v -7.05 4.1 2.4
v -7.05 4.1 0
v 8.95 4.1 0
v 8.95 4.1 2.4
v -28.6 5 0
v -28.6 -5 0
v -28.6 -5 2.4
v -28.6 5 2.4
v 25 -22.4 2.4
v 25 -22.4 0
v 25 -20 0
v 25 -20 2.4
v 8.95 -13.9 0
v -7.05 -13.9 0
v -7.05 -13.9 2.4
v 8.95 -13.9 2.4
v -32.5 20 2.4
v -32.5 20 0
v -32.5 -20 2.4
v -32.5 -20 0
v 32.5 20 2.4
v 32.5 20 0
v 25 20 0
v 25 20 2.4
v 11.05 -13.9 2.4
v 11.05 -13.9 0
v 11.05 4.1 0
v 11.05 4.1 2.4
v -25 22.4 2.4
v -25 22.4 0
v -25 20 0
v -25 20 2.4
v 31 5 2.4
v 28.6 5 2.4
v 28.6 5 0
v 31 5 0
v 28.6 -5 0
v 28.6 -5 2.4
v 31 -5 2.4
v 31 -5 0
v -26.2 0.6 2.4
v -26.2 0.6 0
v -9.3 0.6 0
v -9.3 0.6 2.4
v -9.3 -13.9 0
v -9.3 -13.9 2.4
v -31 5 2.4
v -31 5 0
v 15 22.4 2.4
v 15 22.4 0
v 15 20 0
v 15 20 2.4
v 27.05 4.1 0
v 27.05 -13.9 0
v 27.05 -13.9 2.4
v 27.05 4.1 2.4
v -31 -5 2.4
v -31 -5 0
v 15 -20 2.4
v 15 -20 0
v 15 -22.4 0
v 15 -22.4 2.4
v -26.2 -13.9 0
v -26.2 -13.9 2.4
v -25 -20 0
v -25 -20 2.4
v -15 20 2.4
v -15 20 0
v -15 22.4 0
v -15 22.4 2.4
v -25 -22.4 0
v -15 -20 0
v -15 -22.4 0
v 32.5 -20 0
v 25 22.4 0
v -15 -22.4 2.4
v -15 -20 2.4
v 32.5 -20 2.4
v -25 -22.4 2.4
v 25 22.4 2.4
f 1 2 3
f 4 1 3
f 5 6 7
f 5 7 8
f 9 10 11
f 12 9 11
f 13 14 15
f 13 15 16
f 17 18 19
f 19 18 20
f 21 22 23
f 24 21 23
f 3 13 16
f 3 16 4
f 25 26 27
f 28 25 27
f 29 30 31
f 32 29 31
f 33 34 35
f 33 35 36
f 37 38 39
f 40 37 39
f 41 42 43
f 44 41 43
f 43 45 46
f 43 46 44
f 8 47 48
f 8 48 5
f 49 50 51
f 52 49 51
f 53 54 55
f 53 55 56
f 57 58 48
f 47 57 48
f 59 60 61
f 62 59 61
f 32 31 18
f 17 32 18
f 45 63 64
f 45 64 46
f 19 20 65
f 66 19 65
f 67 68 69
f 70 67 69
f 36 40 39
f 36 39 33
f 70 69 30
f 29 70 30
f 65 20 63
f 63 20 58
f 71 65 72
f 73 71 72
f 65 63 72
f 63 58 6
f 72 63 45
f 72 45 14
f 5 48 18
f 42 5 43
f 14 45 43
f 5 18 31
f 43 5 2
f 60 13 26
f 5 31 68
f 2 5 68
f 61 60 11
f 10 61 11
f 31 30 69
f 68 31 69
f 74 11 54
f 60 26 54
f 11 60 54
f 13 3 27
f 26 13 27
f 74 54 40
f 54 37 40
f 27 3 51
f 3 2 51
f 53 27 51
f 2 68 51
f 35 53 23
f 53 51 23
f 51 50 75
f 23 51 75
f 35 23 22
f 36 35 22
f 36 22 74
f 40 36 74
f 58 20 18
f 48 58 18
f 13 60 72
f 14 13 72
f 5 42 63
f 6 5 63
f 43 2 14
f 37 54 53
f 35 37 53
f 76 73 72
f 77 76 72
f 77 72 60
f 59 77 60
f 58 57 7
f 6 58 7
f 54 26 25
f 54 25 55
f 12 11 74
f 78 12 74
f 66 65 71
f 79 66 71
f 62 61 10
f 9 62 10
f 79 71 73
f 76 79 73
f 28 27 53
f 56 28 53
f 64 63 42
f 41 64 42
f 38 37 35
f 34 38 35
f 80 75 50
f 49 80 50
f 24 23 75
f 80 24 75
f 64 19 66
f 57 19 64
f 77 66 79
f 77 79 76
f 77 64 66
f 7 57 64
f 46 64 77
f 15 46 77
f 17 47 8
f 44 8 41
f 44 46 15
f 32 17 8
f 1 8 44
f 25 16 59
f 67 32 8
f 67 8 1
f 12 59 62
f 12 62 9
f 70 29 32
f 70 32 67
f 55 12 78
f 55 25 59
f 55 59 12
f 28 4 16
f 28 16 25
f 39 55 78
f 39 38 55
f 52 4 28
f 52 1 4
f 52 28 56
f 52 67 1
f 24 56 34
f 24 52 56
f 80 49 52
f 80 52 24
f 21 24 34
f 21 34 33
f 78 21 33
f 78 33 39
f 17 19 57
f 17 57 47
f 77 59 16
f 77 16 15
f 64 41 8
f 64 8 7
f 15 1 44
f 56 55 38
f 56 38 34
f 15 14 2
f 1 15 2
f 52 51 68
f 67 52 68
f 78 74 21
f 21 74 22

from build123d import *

# Parameters (mm, degrees)
F0_W     = 16.9
F0_H     = 14.5
F0_W_2   = 16
F0_H_2   = 18
F0_W_3   = 2.4
F0_H_3   = 10
F1_DEPTH = 2.4


with BuildPart() as f1:
    # F0 (on Top) → F1 (new body)
    with BuildSketch(Plane.XY):
        Polygon((32.5, -20), (32.5, 20), (25, 20), (25, 22.4), (15, 22.4), (15, 20), (-15, 20), (-15, 22.4), (-25, 22.4), (-25, 20), (-32.5, 20), (-32.5, -20), (-25, -20), (-25, -22.4), (-15, -22.4), (-15, -20), (7.5, -20), (15, -20), (15, -22.4), (25, -22.4), (25, -20), align=None)
        with Locations((-17.75, -6.65)):
            Rectangle(F0_W, F0_H, mode=Mode.SUBTRACT)
        with Locations((0.95, -4.9)):
            Rectangle(F0_W_2, F0_H_2, mode=Mode.SUBTRACT)
        with Locations((19.05, -4.9)):
            Rectangle(F0_W_2, F0_H_2, mode=Mode.SUBTRACT)
        with Locations((-29.8, 0)):
            Rectangle(F0_W_3, F0_H_3, mode=Mode.SUBTRACT)
        with Locations((29.8, 0)):
            Rectangle(F0_W_3, F0_H_3, mode=Mode.SUBTRACT)
    extrude(amount=F1_DEPTH)


solid = f1.part
